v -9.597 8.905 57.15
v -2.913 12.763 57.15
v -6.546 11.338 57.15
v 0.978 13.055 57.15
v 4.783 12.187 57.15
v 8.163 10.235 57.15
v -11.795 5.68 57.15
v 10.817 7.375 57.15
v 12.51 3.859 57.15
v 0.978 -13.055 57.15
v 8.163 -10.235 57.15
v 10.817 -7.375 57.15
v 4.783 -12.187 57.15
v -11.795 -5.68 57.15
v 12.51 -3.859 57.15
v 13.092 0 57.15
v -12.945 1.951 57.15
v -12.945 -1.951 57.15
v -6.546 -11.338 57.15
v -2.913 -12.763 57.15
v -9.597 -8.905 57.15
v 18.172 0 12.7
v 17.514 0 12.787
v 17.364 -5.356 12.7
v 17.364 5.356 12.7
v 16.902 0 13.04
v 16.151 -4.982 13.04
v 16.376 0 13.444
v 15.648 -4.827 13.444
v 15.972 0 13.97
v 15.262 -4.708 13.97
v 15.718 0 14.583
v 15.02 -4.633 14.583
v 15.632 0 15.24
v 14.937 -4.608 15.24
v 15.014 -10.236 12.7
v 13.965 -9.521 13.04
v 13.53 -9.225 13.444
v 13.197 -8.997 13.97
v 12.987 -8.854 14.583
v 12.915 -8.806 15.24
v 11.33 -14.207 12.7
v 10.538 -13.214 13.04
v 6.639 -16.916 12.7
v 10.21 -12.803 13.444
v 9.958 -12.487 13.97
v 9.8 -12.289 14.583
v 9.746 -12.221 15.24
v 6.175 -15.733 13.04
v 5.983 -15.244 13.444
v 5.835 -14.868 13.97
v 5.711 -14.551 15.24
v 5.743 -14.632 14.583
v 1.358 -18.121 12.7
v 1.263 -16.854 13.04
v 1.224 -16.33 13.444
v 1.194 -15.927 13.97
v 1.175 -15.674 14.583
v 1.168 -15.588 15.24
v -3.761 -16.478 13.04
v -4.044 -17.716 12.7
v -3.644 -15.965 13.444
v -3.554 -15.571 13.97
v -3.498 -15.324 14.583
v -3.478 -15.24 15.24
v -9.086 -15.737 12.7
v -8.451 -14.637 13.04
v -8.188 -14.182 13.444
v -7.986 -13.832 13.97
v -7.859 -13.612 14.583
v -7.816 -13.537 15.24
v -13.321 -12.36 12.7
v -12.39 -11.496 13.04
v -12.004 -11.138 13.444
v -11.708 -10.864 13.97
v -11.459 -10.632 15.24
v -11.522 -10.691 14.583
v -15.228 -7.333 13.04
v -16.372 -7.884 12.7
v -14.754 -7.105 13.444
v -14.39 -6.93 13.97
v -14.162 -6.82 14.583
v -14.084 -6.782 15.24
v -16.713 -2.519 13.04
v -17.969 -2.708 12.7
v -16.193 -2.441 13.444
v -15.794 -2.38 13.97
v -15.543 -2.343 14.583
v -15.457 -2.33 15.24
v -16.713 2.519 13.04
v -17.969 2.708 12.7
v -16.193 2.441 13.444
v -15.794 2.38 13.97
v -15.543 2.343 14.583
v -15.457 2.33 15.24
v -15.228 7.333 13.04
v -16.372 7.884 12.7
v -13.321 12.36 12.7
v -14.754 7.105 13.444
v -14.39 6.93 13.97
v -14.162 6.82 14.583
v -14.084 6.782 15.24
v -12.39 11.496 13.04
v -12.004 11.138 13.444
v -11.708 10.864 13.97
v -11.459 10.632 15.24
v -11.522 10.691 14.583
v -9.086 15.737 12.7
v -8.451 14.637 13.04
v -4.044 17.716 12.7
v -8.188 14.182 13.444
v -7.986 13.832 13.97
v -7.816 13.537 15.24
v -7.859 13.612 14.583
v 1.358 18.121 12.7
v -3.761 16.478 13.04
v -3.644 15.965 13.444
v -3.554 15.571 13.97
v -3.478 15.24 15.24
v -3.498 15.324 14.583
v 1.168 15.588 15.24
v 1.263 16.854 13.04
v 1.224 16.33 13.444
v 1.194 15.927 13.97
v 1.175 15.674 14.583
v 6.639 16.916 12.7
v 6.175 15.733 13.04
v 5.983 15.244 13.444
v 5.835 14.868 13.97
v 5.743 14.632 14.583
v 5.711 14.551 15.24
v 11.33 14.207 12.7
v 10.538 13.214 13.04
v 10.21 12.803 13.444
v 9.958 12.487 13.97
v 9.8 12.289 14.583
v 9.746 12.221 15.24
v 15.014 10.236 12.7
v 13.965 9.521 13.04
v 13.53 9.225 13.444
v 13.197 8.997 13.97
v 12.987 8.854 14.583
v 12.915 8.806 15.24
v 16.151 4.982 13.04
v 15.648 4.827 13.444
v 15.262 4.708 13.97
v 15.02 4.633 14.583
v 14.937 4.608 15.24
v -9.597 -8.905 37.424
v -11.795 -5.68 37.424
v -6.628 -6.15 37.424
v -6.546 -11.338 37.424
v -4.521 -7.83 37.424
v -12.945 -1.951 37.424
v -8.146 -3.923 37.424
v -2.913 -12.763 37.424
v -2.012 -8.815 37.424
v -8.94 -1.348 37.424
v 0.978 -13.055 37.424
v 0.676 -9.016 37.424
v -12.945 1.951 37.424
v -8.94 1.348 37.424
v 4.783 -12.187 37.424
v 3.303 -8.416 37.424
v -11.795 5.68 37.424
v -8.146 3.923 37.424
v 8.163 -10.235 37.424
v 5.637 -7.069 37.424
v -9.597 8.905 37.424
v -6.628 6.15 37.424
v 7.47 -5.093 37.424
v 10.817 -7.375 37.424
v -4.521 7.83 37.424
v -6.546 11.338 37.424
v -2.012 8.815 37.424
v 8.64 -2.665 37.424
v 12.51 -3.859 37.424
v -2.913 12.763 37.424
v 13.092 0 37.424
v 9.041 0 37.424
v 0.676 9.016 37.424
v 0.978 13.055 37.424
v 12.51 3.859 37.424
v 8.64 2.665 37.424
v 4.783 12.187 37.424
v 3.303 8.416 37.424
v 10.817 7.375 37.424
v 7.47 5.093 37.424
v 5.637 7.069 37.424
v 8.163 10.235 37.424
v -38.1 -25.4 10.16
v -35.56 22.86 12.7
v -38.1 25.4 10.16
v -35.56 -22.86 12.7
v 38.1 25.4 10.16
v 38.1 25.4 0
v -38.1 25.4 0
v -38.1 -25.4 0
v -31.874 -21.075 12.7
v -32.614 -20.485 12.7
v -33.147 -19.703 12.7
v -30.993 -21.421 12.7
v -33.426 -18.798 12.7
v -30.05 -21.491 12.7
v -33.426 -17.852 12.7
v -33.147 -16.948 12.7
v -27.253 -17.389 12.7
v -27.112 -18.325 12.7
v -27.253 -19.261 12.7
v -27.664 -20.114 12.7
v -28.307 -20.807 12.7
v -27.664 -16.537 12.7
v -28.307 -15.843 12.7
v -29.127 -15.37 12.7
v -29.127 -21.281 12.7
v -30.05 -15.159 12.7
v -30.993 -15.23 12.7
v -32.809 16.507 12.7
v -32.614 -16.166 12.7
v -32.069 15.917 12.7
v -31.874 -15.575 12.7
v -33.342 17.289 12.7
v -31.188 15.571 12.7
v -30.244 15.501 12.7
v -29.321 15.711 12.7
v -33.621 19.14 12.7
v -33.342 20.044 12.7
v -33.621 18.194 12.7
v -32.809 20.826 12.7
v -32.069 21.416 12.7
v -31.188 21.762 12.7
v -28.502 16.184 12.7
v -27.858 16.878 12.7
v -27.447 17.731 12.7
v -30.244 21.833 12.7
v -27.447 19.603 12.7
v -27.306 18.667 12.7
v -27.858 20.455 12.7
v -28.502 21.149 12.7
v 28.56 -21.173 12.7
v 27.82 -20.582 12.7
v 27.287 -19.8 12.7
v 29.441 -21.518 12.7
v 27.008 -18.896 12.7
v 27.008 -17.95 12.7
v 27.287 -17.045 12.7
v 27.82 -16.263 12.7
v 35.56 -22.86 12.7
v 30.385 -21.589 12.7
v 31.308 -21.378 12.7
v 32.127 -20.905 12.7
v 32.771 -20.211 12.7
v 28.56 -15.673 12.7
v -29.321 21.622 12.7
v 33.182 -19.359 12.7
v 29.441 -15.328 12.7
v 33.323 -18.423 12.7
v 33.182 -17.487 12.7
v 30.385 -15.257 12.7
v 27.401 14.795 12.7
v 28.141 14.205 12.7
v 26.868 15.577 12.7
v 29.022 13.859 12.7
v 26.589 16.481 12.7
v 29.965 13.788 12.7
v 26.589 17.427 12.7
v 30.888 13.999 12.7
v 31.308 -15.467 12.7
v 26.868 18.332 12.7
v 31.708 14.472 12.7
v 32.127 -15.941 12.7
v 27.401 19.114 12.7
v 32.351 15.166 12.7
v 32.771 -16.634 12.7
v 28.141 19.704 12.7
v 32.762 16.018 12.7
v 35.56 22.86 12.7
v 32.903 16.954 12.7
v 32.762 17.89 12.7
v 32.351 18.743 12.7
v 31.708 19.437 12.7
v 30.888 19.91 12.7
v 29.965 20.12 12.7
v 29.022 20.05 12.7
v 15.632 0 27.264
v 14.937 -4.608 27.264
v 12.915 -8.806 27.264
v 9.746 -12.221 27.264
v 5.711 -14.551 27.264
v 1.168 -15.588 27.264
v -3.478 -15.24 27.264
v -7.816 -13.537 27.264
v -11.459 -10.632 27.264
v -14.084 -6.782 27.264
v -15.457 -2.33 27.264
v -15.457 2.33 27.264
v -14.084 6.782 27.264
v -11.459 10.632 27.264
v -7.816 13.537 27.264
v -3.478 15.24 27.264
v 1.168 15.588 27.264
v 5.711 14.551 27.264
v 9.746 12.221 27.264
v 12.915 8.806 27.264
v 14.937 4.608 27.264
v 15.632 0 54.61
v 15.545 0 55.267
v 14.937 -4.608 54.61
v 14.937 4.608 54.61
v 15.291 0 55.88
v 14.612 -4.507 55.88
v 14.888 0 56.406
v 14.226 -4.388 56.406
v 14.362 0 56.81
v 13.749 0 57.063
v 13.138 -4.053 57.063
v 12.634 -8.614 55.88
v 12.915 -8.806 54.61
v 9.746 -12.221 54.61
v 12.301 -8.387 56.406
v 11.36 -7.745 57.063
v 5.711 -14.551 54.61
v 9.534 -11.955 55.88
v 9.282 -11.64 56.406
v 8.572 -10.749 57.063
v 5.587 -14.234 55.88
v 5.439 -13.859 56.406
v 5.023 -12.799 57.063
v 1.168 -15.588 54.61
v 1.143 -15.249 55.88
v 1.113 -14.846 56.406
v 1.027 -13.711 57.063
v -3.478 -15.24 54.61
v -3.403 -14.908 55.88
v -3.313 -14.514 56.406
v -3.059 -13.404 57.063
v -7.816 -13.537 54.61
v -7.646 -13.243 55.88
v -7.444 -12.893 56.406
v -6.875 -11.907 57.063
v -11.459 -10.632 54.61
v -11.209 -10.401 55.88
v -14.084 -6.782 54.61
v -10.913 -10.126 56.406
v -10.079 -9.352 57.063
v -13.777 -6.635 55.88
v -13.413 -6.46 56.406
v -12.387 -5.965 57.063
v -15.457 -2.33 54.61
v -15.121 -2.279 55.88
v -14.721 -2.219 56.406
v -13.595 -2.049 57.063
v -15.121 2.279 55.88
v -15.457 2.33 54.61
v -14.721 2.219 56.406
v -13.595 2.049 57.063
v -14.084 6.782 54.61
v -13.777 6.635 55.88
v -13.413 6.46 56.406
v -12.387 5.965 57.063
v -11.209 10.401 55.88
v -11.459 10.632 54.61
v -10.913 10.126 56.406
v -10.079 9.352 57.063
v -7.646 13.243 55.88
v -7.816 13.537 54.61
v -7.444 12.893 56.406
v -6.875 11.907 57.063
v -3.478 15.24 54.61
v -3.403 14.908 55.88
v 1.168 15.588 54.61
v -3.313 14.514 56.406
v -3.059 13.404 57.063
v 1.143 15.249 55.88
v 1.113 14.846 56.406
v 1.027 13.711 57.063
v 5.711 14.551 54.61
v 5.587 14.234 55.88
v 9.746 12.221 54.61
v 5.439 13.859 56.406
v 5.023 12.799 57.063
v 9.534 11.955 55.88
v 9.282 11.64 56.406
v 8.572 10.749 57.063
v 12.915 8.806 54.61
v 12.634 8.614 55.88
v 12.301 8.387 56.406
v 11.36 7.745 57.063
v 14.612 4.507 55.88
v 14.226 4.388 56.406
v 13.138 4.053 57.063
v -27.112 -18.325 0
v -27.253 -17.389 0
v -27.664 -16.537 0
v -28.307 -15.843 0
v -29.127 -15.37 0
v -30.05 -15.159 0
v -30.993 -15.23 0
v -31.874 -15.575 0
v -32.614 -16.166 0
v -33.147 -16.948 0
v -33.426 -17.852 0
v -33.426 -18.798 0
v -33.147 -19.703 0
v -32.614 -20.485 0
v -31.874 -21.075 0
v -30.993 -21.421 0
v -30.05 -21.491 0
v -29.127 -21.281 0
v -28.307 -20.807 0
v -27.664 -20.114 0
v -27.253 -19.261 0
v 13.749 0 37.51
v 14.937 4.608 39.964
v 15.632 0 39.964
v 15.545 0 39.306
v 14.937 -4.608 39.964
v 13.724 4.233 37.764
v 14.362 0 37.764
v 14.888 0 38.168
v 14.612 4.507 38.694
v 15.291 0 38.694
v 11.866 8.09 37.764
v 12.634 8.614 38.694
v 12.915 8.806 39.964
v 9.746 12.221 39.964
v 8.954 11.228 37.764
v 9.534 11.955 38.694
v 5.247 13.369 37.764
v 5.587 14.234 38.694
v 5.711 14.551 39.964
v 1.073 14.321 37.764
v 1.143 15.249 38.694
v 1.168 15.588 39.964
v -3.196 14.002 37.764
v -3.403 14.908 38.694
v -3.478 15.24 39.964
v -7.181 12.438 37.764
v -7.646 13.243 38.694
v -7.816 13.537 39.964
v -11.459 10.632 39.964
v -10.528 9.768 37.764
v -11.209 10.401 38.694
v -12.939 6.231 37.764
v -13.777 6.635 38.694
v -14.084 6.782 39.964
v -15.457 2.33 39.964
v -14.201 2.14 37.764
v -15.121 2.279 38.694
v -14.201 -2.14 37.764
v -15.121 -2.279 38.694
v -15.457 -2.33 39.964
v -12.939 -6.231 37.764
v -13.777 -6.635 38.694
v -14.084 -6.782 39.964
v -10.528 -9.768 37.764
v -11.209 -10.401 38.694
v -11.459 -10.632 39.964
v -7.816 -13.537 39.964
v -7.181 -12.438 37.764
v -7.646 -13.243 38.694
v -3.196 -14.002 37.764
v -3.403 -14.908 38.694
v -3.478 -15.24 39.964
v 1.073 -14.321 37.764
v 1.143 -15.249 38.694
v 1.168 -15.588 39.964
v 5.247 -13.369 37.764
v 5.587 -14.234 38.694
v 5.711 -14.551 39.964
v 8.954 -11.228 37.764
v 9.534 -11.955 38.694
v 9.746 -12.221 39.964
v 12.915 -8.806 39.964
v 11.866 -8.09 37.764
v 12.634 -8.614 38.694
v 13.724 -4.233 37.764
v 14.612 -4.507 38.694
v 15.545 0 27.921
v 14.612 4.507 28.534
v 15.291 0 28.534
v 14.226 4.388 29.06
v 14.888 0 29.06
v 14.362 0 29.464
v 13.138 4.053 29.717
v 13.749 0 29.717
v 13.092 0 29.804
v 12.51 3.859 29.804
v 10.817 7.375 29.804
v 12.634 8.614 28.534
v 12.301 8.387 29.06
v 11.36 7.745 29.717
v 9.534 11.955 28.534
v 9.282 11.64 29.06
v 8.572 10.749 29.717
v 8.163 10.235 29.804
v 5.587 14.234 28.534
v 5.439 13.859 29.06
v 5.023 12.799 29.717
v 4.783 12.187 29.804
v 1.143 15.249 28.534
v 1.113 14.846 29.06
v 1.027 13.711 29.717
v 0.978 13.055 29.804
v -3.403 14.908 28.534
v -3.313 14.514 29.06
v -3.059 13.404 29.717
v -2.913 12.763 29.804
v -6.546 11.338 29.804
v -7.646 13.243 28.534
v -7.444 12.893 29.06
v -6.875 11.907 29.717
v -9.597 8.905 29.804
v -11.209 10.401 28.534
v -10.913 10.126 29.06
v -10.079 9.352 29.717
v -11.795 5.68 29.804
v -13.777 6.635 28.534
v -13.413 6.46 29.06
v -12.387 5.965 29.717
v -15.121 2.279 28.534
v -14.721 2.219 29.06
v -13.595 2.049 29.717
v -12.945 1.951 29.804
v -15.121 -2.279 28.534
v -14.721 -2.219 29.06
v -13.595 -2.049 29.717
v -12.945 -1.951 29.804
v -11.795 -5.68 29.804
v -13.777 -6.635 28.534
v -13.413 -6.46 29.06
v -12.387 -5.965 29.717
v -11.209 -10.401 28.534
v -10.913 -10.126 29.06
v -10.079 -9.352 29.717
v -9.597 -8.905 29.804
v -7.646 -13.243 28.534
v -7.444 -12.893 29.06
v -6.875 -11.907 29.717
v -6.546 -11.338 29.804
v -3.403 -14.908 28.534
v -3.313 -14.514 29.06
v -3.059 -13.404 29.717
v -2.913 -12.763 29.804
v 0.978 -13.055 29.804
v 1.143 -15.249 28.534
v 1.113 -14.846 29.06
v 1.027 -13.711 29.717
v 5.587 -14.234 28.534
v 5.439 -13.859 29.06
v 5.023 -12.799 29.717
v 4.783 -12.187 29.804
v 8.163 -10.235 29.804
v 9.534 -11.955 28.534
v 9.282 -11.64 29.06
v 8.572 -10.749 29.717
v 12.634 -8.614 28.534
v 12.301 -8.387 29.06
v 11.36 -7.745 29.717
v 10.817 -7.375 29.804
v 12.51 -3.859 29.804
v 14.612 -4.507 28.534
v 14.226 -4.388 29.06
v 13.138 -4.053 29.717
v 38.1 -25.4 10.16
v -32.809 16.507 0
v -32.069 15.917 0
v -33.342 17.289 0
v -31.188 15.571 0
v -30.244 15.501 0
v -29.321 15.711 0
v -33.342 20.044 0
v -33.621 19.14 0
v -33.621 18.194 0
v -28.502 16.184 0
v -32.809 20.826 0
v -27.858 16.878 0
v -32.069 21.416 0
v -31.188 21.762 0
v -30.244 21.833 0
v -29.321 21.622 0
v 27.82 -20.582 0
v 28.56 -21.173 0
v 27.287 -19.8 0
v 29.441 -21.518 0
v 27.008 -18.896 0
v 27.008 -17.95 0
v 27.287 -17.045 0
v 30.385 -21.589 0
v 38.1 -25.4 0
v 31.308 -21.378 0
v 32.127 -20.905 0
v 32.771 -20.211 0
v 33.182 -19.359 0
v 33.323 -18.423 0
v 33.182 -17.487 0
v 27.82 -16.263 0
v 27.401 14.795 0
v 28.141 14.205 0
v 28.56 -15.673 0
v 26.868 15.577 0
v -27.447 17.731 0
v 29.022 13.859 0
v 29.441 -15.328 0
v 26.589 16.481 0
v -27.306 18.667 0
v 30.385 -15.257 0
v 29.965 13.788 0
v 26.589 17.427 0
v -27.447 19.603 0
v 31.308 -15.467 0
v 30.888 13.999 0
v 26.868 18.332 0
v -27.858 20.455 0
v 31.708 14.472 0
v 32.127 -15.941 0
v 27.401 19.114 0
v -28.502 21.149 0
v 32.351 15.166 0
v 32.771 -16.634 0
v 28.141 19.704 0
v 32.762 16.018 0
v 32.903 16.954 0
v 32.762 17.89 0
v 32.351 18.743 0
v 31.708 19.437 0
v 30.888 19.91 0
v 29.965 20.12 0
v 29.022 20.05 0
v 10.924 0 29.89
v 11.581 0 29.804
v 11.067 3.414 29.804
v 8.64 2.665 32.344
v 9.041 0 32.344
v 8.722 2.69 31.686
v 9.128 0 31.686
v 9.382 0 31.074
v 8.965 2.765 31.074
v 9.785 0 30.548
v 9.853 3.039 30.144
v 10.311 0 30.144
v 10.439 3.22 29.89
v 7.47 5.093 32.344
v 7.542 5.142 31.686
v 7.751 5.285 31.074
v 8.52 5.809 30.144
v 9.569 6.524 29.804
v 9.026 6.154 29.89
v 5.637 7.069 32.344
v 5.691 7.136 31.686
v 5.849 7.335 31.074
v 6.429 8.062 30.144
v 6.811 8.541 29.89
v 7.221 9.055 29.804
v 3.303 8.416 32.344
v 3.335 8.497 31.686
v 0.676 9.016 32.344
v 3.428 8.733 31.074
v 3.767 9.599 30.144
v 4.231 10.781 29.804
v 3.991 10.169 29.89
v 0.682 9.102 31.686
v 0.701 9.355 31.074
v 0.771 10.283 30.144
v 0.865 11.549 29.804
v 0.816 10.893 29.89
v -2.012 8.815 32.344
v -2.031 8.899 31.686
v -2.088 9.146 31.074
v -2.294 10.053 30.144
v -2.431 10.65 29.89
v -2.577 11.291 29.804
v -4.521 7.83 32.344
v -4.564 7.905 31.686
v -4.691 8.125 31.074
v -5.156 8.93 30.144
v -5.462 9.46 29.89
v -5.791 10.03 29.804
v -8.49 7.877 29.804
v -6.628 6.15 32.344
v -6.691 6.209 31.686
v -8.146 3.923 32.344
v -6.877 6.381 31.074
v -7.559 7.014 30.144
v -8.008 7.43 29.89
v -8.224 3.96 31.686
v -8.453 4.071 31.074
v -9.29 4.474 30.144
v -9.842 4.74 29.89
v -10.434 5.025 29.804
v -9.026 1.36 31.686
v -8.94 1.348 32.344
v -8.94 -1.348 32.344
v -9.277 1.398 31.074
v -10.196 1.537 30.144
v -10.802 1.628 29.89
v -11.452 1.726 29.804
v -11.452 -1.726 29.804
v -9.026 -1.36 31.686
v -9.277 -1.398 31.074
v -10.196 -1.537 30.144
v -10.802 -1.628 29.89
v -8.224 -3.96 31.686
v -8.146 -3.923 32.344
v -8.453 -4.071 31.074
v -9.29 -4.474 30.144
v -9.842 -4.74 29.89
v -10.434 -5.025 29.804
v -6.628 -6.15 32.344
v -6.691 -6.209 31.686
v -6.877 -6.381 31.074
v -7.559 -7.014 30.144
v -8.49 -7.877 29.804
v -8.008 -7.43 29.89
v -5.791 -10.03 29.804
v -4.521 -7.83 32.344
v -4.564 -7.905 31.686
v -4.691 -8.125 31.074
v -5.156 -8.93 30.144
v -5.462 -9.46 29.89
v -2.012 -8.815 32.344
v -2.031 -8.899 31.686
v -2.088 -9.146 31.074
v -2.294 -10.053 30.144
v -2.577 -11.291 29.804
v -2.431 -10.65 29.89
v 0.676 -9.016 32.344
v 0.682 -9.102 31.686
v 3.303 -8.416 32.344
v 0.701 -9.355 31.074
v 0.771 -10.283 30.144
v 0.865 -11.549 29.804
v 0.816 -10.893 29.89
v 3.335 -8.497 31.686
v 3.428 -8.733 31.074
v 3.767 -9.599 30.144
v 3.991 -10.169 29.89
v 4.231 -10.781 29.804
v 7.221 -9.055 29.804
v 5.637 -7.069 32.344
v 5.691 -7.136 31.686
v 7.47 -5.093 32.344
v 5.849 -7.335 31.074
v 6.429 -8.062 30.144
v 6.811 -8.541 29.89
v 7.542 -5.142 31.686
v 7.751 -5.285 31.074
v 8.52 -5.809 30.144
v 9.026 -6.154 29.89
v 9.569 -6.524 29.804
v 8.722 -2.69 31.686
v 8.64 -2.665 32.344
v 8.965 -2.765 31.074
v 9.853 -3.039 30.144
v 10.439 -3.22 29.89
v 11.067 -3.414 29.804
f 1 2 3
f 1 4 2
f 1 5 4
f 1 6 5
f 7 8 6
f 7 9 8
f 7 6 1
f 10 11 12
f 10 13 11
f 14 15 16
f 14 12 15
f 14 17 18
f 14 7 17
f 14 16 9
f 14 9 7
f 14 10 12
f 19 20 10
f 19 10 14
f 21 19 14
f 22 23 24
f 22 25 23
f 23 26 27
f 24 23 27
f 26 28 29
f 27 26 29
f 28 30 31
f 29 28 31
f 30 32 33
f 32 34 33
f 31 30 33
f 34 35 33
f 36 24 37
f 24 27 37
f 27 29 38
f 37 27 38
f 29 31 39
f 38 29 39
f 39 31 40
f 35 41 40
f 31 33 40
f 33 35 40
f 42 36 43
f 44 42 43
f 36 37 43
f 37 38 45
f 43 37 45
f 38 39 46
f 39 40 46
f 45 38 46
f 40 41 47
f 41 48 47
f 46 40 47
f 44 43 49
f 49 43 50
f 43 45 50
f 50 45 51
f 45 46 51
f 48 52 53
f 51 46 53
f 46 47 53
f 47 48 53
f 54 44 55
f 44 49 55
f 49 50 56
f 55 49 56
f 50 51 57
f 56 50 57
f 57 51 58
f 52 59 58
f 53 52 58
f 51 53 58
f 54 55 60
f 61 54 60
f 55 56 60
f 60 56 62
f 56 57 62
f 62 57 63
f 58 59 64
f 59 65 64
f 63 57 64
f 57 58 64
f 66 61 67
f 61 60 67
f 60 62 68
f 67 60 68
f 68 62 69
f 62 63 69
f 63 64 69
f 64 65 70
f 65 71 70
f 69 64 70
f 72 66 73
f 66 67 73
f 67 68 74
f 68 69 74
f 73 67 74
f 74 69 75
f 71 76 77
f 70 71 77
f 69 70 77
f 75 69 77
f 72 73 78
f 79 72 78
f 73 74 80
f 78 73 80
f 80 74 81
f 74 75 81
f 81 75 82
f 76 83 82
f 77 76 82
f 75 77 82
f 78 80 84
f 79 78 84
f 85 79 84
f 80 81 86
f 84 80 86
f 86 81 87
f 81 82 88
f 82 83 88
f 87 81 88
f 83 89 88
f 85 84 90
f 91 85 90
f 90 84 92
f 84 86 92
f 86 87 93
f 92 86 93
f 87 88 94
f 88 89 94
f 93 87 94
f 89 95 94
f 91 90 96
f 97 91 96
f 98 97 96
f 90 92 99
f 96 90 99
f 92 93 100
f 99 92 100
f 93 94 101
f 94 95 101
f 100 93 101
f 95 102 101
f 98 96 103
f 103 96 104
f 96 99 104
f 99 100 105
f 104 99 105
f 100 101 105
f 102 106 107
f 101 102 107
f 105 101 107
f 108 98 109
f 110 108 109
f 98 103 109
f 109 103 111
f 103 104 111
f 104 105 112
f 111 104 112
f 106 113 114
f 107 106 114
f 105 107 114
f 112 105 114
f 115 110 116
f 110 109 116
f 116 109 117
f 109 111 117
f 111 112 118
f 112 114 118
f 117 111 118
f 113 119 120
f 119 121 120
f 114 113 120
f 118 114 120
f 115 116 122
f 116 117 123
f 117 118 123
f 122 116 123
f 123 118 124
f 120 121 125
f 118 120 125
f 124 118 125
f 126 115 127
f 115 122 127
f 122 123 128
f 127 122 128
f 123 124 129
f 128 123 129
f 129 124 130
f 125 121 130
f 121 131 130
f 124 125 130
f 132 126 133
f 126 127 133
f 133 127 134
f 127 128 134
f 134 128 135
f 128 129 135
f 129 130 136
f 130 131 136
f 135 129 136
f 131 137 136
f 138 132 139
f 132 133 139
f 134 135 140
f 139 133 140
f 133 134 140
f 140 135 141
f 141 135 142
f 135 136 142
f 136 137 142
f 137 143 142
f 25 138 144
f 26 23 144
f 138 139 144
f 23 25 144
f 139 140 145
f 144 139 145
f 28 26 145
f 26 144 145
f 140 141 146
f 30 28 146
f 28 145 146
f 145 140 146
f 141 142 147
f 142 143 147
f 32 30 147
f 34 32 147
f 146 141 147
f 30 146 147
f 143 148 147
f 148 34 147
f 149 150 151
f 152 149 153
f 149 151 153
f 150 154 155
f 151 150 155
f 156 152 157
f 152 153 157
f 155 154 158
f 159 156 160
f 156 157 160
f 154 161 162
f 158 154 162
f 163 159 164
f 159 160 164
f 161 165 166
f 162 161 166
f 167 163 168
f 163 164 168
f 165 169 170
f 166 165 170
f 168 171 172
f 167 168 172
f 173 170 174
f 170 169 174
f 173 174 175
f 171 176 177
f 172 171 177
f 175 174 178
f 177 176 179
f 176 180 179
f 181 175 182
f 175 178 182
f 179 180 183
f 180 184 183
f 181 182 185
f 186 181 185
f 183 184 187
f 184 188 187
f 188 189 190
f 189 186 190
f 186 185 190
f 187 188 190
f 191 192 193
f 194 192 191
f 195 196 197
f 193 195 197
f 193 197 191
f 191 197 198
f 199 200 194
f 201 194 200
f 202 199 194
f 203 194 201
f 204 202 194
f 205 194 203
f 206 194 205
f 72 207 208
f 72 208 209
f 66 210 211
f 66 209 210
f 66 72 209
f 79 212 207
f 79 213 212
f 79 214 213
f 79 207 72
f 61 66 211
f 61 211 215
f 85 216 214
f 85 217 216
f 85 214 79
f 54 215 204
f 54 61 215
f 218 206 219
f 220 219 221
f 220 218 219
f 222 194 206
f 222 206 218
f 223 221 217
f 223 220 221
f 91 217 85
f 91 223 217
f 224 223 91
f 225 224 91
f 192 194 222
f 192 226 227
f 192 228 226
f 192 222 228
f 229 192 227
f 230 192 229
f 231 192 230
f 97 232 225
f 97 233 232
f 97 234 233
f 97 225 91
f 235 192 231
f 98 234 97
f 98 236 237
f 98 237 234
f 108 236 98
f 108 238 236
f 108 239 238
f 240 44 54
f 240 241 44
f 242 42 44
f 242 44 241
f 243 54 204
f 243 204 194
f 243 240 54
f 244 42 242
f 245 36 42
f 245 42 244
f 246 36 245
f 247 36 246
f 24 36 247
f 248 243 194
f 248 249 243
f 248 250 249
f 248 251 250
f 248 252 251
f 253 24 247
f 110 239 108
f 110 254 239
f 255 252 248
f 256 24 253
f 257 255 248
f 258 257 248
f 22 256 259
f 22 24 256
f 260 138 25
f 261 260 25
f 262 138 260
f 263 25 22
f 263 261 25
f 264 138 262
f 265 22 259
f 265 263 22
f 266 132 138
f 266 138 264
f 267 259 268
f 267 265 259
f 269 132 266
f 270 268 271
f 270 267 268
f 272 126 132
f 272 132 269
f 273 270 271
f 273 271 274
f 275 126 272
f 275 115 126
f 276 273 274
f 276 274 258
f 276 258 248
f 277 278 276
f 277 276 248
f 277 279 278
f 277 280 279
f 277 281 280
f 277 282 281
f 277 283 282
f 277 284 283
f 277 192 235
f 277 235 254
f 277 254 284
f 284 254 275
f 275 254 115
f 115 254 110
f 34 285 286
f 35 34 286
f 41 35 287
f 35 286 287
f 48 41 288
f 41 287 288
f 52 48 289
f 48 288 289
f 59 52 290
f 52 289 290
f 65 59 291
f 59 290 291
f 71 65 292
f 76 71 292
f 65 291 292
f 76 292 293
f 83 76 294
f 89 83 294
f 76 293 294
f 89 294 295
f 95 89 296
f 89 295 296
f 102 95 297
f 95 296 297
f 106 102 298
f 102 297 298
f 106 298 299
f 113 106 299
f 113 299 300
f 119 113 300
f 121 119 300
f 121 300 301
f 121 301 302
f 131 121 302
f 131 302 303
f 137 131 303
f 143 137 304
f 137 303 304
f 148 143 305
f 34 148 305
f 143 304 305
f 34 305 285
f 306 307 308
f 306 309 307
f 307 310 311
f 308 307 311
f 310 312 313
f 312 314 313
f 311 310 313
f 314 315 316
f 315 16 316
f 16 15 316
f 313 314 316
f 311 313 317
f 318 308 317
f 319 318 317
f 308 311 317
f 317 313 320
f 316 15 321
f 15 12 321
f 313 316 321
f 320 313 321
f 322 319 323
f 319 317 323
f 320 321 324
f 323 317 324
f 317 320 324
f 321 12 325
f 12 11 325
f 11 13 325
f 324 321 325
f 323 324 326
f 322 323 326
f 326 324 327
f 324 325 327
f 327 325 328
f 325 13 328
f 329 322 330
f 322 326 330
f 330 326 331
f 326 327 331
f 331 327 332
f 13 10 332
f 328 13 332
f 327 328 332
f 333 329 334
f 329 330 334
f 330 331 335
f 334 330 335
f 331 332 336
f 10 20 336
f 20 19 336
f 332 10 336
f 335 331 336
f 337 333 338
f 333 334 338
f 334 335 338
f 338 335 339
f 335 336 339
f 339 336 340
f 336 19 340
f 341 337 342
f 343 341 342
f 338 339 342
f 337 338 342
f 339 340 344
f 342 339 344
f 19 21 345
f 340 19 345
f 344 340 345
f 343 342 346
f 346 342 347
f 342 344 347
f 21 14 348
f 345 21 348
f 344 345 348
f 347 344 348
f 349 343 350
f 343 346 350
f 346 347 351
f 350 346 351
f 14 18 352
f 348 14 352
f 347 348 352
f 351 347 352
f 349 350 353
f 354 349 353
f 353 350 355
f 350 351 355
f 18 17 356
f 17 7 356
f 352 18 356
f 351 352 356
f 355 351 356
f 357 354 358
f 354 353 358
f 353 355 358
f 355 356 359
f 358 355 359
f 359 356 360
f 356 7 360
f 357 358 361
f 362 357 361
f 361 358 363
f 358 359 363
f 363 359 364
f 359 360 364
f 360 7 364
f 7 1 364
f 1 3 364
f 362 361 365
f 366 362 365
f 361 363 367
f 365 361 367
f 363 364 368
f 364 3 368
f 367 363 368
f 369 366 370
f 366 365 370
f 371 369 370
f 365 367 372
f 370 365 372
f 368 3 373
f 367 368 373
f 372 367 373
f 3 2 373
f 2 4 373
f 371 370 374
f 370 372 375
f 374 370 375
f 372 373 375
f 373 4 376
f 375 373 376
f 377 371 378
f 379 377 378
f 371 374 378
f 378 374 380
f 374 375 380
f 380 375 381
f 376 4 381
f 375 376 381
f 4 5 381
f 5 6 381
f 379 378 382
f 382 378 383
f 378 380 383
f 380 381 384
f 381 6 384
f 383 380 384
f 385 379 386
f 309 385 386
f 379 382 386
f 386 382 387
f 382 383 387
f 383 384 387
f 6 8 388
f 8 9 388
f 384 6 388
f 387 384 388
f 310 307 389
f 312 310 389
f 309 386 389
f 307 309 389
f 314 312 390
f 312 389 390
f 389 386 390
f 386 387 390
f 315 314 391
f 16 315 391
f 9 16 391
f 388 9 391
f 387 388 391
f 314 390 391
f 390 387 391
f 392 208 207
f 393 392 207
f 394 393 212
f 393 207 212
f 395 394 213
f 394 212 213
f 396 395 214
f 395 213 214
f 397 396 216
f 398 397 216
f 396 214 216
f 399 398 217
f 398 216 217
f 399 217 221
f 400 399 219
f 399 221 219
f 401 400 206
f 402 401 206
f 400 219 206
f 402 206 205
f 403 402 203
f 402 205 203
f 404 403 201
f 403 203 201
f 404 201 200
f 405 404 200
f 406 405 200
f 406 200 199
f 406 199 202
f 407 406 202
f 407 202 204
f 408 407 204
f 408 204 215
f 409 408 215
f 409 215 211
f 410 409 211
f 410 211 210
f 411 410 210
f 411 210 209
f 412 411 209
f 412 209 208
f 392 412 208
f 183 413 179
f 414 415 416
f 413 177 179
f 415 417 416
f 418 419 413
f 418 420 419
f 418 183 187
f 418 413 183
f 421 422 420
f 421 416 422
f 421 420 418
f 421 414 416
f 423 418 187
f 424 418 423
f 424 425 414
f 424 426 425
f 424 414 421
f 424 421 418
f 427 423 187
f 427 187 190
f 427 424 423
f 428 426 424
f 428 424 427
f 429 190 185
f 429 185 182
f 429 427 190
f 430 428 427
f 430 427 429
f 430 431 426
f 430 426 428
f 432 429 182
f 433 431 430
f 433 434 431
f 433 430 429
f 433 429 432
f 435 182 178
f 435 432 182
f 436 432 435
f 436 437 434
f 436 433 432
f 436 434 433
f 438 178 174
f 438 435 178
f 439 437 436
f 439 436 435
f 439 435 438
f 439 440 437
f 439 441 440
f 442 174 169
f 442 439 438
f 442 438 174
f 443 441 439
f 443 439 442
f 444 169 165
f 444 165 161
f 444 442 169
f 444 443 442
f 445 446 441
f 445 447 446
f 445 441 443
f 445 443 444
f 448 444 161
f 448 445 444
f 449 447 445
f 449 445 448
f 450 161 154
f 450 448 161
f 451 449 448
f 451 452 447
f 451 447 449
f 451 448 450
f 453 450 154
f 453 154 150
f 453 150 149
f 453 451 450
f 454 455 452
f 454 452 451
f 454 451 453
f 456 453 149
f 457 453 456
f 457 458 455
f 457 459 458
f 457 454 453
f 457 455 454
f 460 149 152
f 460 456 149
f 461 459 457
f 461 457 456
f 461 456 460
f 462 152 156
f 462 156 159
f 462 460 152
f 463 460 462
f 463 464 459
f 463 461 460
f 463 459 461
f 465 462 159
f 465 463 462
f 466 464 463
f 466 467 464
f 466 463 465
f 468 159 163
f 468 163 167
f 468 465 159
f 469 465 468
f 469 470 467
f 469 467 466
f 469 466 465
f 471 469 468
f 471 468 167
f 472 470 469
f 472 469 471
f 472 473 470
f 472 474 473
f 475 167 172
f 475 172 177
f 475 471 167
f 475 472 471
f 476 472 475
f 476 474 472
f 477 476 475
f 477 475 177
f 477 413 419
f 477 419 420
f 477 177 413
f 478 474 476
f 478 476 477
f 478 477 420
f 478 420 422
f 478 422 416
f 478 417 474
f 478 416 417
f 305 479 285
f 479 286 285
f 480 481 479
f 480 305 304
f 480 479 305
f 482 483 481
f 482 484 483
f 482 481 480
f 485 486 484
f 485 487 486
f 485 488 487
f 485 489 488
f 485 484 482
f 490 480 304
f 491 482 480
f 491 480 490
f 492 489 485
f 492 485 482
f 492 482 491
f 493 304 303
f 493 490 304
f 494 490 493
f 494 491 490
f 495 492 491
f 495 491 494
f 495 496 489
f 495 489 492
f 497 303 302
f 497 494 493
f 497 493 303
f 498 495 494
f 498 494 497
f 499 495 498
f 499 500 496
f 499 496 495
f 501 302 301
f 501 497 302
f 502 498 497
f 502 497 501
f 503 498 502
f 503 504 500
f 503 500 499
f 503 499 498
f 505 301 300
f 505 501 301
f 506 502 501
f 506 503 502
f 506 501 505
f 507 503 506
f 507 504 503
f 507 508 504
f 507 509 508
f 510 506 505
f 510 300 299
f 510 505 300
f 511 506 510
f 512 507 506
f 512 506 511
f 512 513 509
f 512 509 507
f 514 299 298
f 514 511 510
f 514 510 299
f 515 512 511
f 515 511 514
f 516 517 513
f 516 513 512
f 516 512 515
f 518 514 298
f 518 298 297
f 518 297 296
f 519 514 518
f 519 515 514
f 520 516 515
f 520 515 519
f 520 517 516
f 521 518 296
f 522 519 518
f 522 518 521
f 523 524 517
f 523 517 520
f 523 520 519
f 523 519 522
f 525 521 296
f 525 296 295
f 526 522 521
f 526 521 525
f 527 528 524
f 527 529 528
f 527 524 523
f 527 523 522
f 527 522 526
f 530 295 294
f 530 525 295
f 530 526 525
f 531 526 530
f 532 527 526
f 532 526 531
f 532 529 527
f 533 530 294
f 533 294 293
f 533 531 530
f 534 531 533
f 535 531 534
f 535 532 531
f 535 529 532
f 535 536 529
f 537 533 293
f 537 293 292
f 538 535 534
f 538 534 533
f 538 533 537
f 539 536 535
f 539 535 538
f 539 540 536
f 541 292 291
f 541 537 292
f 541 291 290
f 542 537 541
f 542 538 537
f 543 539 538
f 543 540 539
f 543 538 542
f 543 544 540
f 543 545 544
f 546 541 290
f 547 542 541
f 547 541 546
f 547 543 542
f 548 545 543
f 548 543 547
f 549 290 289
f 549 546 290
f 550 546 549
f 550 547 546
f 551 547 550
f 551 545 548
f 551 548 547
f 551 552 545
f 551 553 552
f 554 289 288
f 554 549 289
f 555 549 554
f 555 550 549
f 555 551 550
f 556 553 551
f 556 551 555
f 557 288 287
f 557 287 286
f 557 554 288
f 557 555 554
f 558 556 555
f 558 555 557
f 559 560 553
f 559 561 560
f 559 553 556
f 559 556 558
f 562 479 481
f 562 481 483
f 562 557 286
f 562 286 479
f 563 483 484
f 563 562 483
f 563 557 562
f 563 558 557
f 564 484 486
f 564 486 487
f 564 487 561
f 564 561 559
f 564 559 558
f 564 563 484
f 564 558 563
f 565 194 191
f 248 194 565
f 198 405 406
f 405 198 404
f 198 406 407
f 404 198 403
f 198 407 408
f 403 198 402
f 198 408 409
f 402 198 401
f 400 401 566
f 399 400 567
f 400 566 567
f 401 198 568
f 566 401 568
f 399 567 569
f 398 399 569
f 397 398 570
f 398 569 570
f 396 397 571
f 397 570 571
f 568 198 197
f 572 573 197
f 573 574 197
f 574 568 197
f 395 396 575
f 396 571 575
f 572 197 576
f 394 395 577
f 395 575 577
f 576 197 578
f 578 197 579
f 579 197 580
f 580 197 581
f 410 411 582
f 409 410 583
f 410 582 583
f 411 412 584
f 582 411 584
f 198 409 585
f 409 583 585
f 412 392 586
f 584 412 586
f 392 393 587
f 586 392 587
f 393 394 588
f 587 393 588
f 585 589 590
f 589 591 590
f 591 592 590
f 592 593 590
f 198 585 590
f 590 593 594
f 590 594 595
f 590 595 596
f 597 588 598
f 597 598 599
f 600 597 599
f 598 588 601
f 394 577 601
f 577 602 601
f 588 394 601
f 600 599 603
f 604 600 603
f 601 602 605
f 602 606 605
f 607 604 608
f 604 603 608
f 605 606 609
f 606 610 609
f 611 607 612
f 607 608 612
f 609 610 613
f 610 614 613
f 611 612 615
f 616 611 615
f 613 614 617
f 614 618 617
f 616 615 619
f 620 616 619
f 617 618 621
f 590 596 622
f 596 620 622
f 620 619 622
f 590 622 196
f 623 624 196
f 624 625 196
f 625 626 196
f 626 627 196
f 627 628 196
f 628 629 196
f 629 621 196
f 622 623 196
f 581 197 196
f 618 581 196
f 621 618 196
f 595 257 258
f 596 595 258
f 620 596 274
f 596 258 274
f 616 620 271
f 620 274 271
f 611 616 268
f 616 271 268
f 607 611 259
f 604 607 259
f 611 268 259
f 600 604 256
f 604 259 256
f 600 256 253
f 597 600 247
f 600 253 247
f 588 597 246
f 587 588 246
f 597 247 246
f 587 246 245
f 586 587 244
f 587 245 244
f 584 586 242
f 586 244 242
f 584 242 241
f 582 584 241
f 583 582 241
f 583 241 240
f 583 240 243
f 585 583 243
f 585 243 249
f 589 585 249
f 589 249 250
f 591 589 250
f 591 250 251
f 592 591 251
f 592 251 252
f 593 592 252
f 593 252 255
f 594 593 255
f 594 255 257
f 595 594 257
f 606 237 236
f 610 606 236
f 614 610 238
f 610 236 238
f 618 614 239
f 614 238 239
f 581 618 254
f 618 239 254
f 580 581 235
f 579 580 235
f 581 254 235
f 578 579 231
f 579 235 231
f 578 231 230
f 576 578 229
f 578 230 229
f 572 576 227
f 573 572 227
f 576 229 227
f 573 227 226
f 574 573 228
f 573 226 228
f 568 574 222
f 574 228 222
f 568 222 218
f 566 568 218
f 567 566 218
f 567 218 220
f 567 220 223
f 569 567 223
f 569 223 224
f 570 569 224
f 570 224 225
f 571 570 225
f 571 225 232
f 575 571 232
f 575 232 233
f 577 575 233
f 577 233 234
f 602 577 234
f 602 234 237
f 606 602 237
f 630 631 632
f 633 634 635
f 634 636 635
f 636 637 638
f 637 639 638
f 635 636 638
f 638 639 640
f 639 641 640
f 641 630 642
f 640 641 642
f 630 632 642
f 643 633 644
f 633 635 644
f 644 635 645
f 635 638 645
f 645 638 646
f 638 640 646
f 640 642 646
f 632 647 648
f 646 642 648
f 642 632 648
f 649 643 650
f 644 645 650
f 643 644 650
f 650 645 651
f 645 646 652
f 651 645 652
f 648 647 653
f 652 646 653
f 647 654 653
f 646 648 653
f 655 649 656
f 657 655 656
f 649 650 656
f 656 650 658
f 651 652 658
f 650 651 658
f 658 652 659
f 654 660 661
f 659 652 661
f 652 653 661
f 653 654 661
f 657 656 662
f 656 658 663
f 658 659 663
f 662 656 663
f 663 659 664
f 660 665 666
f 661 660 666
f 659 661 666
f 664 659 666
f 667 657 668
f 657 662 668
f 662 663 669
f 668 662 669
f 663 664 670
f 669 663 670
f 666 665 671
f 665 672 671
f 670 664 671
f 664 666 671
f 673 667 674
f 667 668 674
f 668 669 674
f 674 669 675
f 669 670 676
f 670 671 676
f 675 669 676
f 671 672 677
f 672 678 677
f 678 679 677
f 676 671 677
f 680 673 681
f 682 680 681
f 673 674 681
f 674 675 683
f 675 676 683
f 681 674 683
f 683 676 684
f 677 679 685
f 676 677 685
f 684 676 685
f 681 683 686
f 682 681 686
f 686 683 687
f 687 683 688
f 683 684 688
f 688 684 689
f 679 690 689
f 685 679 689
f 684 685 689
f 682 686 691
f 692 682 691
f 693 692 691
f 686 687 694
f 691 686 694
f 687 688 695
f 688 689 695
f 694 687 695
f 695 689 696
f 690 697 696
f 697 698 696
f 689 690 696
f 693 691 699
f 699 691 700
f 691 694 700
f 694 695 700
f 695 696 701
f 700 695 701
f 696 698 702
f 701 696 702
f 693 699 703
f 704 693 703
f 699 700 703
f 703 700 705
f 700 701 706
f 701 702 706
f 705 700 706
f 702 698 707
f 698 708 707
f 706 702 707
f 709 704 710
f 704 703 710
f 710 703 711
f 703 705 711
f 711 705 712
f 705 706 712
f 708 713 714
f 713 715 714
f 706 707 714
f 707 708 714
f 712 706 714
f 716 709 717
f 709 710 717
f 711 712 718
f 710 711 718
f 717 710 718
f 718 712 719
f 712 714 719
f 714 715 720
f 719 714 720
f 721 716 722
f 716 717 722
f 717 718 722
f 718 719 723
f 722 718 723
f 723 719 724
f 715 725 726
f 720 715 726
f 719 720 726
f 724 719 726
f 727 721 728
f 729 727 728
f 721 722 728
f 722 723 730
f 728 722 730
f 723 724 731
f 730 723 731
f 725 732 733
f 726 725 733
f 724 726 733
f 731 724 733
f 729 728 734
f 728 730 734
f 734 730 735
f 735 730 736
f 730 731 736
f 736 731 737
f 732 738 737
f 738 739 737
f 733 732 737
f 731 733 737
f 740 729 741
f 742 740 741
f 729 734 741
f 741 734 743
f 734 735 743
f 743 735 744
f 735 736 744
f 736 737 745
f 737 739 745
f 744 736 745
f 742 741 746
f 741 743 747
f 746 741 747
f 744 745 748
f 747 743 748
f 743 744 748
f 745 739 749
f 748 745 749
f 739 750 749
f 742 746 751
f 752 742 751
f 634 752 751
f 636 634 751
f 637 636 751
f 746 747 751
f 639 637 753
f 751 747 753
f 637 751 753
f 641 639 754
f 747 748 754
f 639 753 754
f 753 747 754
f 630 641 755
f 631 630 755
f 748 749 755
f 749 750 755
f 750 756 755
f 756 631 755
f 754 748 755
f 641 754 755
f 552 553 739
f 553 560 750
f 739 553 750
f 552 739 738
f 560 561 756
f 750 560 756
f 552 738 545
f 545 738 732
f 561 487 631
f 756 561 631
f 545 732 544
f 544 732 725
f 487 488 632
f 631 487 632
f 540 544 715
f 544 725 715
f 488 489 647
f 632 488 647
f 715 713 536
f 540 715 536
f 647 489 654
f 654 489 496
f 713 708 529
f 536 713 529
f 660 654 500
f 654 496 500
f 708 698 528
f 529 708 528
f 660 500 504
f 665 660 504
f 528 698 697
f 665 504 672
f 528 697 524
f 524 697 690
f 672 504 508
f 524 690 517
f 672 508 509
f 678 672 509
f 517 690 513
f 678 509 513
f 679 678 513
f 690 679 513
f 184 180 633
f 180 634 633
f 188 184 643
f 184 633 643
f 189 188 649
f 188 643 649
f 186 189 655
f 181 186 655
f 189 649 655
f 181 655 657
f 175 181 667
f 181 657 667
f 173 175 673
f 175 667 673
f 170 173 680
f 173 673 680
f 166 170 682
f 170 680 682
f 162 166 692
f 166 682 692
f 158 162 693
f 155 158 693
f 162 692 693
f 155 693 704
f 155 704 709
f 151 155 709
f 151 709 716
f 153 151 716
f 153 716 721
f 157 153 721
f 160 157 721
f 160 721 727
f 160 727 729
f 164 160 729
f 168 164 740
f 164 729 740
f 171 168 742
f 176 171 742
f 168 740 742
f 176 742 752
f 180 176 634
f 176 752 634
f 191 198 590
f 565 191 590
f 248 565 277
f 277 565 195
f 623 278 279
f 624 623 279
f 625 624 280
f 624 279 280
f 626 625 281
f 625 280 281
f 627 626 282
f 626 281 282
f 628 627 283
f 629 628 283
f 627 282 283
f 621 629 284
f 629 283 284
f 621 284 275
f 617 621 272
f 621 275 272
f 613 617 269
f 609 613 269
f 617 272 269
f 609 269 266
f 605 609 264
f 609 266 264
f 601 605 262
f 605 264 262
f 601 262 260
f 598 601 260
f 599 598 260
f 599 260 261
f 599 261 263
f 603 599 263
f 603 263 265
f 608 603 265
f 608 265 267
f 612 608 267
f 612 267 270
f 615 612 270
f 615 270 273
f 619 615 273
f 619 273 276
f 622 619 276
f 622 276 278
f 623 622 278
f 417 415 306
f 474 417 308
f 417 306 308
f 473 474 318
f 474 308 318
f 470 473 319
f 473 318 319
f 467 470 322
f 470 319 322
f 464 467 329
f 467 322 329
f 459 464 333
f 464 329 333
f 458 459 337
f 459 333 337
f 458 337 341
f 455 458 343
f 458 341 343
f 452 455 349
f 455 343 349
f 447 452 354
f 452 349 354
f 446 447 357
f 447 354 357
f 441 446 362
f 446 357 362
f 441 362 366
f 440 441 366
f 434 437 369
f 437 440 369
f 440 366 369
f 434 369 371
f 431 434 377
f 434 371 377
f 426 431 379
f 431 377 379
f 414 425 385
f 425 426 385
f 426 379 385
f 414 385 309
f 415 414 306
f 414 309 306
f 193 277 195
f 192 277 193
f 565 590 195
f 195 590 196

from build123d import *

# Parameters (mm, degrees)
F1_DEPTH = 12.7
F2_R     = 3.175
F3_DEPTH = 25.4
F4_W     = 15.6316435844
F4_H     = 44.45
F6_SIZE  = 2.54
F9_R     = 2.54


# Not quite as in the source:
# - a feature names something its author has since deleted; it is built from what else it names


with BuildPart() as f1:
    # F0 (on Top) → F1 (new body)
    with BuildSketch(Plane.XY):
        Polygon((27.94, 25.4), (-27.94, 25.4), (-38.1, 25.4), (-38.1, 15.24), (-38.1, -15.24), (-38.1, -25.4), (-27.94, -25.4), (27.94, -25.4), (38.1, -25.4), (38.1, -15.24), (38.1, 15.24), (38.1, 25.4), align=None)
    extrude(amount=F1_DEPTH)

    # F2 (on face) → F3 (cut)
    with BuildSketch(Plane.XY.offset(12.7)):
        with Locations((-30.4814037019, 18.666748425)):
            Circle(F2_R)
        with Locations((29.7281444444, 16.9542004048)):
            Circle(F2_R)
        with Locations((30.147915706, -18.4229128063)):
            Circle(F2_R)
        with Locations((-30.2868466824, -18.3251220733)):
            Circle(F2_R)
    extrude(amount=-F3_DEPTH, mode=Mode.SUBTRACT)

    # F4 (on Front) → F5 (revolve)
    with BuildSketch(Plane.XZ):
        with Locations((7.8158217922, 34.925)):
            Rectangle(F4_W, F4_H)
    revolve(axis=Axis((0, 0, 34.925), (0, 0, -1)))

    # F6
    f6_edges = [f1.edges().sort_by_distance(p)[0] for p in [
        (0, -25.4, 12.7),
        (38.1, 0, 12.7),
        (0, 25.4, 12.7),
        (-38.1, 0, 12.7),
    ]]
    chamfer(f6_edges, length=F6_SIZE)

    # F7 (on Front) → F8 (revolve, cut)
    with BuildSketch(Plane.XZ):
        with BuildLine():
            Line((19.2013573515, 37.423838021), (9.0413573515, 37.423838021))
            Line((9.0413573515, 37.423838021), (9.0413573515, 32.343838021))
            ThreePointArc((9.0413573515, 32.343838021), (9.7853061273, 30.5477867968), (11.5813573515, 29.803838021))
            Line((11.5813573515, 29.803838021), (19.2013573515, 29.803838021))
            Line((19.2013573515, 29.803838021), (19.2013573515, 37.423838021))
        make_face()
    revolve(axis=Axis((0, 0, 12.7), (0, 0, 1)), mode=Mode.SUBTRACT)

    # F9
    f9_edges = [f1.edges().sort_by_distance(p)[0] for p in [
        (-15.631644, 0, 12.7),
        (-15.631644, 0, 57.15),
        (15.631644, 0, 21.251919),
        (-15.631644, 0, 29.803838),
        (-15.631644, 0, 37.423838),
        (15.631644, 0, 47.286919),
    ]]
    fillet(f9_edges, radius=F9_R)


solid = f1.part
